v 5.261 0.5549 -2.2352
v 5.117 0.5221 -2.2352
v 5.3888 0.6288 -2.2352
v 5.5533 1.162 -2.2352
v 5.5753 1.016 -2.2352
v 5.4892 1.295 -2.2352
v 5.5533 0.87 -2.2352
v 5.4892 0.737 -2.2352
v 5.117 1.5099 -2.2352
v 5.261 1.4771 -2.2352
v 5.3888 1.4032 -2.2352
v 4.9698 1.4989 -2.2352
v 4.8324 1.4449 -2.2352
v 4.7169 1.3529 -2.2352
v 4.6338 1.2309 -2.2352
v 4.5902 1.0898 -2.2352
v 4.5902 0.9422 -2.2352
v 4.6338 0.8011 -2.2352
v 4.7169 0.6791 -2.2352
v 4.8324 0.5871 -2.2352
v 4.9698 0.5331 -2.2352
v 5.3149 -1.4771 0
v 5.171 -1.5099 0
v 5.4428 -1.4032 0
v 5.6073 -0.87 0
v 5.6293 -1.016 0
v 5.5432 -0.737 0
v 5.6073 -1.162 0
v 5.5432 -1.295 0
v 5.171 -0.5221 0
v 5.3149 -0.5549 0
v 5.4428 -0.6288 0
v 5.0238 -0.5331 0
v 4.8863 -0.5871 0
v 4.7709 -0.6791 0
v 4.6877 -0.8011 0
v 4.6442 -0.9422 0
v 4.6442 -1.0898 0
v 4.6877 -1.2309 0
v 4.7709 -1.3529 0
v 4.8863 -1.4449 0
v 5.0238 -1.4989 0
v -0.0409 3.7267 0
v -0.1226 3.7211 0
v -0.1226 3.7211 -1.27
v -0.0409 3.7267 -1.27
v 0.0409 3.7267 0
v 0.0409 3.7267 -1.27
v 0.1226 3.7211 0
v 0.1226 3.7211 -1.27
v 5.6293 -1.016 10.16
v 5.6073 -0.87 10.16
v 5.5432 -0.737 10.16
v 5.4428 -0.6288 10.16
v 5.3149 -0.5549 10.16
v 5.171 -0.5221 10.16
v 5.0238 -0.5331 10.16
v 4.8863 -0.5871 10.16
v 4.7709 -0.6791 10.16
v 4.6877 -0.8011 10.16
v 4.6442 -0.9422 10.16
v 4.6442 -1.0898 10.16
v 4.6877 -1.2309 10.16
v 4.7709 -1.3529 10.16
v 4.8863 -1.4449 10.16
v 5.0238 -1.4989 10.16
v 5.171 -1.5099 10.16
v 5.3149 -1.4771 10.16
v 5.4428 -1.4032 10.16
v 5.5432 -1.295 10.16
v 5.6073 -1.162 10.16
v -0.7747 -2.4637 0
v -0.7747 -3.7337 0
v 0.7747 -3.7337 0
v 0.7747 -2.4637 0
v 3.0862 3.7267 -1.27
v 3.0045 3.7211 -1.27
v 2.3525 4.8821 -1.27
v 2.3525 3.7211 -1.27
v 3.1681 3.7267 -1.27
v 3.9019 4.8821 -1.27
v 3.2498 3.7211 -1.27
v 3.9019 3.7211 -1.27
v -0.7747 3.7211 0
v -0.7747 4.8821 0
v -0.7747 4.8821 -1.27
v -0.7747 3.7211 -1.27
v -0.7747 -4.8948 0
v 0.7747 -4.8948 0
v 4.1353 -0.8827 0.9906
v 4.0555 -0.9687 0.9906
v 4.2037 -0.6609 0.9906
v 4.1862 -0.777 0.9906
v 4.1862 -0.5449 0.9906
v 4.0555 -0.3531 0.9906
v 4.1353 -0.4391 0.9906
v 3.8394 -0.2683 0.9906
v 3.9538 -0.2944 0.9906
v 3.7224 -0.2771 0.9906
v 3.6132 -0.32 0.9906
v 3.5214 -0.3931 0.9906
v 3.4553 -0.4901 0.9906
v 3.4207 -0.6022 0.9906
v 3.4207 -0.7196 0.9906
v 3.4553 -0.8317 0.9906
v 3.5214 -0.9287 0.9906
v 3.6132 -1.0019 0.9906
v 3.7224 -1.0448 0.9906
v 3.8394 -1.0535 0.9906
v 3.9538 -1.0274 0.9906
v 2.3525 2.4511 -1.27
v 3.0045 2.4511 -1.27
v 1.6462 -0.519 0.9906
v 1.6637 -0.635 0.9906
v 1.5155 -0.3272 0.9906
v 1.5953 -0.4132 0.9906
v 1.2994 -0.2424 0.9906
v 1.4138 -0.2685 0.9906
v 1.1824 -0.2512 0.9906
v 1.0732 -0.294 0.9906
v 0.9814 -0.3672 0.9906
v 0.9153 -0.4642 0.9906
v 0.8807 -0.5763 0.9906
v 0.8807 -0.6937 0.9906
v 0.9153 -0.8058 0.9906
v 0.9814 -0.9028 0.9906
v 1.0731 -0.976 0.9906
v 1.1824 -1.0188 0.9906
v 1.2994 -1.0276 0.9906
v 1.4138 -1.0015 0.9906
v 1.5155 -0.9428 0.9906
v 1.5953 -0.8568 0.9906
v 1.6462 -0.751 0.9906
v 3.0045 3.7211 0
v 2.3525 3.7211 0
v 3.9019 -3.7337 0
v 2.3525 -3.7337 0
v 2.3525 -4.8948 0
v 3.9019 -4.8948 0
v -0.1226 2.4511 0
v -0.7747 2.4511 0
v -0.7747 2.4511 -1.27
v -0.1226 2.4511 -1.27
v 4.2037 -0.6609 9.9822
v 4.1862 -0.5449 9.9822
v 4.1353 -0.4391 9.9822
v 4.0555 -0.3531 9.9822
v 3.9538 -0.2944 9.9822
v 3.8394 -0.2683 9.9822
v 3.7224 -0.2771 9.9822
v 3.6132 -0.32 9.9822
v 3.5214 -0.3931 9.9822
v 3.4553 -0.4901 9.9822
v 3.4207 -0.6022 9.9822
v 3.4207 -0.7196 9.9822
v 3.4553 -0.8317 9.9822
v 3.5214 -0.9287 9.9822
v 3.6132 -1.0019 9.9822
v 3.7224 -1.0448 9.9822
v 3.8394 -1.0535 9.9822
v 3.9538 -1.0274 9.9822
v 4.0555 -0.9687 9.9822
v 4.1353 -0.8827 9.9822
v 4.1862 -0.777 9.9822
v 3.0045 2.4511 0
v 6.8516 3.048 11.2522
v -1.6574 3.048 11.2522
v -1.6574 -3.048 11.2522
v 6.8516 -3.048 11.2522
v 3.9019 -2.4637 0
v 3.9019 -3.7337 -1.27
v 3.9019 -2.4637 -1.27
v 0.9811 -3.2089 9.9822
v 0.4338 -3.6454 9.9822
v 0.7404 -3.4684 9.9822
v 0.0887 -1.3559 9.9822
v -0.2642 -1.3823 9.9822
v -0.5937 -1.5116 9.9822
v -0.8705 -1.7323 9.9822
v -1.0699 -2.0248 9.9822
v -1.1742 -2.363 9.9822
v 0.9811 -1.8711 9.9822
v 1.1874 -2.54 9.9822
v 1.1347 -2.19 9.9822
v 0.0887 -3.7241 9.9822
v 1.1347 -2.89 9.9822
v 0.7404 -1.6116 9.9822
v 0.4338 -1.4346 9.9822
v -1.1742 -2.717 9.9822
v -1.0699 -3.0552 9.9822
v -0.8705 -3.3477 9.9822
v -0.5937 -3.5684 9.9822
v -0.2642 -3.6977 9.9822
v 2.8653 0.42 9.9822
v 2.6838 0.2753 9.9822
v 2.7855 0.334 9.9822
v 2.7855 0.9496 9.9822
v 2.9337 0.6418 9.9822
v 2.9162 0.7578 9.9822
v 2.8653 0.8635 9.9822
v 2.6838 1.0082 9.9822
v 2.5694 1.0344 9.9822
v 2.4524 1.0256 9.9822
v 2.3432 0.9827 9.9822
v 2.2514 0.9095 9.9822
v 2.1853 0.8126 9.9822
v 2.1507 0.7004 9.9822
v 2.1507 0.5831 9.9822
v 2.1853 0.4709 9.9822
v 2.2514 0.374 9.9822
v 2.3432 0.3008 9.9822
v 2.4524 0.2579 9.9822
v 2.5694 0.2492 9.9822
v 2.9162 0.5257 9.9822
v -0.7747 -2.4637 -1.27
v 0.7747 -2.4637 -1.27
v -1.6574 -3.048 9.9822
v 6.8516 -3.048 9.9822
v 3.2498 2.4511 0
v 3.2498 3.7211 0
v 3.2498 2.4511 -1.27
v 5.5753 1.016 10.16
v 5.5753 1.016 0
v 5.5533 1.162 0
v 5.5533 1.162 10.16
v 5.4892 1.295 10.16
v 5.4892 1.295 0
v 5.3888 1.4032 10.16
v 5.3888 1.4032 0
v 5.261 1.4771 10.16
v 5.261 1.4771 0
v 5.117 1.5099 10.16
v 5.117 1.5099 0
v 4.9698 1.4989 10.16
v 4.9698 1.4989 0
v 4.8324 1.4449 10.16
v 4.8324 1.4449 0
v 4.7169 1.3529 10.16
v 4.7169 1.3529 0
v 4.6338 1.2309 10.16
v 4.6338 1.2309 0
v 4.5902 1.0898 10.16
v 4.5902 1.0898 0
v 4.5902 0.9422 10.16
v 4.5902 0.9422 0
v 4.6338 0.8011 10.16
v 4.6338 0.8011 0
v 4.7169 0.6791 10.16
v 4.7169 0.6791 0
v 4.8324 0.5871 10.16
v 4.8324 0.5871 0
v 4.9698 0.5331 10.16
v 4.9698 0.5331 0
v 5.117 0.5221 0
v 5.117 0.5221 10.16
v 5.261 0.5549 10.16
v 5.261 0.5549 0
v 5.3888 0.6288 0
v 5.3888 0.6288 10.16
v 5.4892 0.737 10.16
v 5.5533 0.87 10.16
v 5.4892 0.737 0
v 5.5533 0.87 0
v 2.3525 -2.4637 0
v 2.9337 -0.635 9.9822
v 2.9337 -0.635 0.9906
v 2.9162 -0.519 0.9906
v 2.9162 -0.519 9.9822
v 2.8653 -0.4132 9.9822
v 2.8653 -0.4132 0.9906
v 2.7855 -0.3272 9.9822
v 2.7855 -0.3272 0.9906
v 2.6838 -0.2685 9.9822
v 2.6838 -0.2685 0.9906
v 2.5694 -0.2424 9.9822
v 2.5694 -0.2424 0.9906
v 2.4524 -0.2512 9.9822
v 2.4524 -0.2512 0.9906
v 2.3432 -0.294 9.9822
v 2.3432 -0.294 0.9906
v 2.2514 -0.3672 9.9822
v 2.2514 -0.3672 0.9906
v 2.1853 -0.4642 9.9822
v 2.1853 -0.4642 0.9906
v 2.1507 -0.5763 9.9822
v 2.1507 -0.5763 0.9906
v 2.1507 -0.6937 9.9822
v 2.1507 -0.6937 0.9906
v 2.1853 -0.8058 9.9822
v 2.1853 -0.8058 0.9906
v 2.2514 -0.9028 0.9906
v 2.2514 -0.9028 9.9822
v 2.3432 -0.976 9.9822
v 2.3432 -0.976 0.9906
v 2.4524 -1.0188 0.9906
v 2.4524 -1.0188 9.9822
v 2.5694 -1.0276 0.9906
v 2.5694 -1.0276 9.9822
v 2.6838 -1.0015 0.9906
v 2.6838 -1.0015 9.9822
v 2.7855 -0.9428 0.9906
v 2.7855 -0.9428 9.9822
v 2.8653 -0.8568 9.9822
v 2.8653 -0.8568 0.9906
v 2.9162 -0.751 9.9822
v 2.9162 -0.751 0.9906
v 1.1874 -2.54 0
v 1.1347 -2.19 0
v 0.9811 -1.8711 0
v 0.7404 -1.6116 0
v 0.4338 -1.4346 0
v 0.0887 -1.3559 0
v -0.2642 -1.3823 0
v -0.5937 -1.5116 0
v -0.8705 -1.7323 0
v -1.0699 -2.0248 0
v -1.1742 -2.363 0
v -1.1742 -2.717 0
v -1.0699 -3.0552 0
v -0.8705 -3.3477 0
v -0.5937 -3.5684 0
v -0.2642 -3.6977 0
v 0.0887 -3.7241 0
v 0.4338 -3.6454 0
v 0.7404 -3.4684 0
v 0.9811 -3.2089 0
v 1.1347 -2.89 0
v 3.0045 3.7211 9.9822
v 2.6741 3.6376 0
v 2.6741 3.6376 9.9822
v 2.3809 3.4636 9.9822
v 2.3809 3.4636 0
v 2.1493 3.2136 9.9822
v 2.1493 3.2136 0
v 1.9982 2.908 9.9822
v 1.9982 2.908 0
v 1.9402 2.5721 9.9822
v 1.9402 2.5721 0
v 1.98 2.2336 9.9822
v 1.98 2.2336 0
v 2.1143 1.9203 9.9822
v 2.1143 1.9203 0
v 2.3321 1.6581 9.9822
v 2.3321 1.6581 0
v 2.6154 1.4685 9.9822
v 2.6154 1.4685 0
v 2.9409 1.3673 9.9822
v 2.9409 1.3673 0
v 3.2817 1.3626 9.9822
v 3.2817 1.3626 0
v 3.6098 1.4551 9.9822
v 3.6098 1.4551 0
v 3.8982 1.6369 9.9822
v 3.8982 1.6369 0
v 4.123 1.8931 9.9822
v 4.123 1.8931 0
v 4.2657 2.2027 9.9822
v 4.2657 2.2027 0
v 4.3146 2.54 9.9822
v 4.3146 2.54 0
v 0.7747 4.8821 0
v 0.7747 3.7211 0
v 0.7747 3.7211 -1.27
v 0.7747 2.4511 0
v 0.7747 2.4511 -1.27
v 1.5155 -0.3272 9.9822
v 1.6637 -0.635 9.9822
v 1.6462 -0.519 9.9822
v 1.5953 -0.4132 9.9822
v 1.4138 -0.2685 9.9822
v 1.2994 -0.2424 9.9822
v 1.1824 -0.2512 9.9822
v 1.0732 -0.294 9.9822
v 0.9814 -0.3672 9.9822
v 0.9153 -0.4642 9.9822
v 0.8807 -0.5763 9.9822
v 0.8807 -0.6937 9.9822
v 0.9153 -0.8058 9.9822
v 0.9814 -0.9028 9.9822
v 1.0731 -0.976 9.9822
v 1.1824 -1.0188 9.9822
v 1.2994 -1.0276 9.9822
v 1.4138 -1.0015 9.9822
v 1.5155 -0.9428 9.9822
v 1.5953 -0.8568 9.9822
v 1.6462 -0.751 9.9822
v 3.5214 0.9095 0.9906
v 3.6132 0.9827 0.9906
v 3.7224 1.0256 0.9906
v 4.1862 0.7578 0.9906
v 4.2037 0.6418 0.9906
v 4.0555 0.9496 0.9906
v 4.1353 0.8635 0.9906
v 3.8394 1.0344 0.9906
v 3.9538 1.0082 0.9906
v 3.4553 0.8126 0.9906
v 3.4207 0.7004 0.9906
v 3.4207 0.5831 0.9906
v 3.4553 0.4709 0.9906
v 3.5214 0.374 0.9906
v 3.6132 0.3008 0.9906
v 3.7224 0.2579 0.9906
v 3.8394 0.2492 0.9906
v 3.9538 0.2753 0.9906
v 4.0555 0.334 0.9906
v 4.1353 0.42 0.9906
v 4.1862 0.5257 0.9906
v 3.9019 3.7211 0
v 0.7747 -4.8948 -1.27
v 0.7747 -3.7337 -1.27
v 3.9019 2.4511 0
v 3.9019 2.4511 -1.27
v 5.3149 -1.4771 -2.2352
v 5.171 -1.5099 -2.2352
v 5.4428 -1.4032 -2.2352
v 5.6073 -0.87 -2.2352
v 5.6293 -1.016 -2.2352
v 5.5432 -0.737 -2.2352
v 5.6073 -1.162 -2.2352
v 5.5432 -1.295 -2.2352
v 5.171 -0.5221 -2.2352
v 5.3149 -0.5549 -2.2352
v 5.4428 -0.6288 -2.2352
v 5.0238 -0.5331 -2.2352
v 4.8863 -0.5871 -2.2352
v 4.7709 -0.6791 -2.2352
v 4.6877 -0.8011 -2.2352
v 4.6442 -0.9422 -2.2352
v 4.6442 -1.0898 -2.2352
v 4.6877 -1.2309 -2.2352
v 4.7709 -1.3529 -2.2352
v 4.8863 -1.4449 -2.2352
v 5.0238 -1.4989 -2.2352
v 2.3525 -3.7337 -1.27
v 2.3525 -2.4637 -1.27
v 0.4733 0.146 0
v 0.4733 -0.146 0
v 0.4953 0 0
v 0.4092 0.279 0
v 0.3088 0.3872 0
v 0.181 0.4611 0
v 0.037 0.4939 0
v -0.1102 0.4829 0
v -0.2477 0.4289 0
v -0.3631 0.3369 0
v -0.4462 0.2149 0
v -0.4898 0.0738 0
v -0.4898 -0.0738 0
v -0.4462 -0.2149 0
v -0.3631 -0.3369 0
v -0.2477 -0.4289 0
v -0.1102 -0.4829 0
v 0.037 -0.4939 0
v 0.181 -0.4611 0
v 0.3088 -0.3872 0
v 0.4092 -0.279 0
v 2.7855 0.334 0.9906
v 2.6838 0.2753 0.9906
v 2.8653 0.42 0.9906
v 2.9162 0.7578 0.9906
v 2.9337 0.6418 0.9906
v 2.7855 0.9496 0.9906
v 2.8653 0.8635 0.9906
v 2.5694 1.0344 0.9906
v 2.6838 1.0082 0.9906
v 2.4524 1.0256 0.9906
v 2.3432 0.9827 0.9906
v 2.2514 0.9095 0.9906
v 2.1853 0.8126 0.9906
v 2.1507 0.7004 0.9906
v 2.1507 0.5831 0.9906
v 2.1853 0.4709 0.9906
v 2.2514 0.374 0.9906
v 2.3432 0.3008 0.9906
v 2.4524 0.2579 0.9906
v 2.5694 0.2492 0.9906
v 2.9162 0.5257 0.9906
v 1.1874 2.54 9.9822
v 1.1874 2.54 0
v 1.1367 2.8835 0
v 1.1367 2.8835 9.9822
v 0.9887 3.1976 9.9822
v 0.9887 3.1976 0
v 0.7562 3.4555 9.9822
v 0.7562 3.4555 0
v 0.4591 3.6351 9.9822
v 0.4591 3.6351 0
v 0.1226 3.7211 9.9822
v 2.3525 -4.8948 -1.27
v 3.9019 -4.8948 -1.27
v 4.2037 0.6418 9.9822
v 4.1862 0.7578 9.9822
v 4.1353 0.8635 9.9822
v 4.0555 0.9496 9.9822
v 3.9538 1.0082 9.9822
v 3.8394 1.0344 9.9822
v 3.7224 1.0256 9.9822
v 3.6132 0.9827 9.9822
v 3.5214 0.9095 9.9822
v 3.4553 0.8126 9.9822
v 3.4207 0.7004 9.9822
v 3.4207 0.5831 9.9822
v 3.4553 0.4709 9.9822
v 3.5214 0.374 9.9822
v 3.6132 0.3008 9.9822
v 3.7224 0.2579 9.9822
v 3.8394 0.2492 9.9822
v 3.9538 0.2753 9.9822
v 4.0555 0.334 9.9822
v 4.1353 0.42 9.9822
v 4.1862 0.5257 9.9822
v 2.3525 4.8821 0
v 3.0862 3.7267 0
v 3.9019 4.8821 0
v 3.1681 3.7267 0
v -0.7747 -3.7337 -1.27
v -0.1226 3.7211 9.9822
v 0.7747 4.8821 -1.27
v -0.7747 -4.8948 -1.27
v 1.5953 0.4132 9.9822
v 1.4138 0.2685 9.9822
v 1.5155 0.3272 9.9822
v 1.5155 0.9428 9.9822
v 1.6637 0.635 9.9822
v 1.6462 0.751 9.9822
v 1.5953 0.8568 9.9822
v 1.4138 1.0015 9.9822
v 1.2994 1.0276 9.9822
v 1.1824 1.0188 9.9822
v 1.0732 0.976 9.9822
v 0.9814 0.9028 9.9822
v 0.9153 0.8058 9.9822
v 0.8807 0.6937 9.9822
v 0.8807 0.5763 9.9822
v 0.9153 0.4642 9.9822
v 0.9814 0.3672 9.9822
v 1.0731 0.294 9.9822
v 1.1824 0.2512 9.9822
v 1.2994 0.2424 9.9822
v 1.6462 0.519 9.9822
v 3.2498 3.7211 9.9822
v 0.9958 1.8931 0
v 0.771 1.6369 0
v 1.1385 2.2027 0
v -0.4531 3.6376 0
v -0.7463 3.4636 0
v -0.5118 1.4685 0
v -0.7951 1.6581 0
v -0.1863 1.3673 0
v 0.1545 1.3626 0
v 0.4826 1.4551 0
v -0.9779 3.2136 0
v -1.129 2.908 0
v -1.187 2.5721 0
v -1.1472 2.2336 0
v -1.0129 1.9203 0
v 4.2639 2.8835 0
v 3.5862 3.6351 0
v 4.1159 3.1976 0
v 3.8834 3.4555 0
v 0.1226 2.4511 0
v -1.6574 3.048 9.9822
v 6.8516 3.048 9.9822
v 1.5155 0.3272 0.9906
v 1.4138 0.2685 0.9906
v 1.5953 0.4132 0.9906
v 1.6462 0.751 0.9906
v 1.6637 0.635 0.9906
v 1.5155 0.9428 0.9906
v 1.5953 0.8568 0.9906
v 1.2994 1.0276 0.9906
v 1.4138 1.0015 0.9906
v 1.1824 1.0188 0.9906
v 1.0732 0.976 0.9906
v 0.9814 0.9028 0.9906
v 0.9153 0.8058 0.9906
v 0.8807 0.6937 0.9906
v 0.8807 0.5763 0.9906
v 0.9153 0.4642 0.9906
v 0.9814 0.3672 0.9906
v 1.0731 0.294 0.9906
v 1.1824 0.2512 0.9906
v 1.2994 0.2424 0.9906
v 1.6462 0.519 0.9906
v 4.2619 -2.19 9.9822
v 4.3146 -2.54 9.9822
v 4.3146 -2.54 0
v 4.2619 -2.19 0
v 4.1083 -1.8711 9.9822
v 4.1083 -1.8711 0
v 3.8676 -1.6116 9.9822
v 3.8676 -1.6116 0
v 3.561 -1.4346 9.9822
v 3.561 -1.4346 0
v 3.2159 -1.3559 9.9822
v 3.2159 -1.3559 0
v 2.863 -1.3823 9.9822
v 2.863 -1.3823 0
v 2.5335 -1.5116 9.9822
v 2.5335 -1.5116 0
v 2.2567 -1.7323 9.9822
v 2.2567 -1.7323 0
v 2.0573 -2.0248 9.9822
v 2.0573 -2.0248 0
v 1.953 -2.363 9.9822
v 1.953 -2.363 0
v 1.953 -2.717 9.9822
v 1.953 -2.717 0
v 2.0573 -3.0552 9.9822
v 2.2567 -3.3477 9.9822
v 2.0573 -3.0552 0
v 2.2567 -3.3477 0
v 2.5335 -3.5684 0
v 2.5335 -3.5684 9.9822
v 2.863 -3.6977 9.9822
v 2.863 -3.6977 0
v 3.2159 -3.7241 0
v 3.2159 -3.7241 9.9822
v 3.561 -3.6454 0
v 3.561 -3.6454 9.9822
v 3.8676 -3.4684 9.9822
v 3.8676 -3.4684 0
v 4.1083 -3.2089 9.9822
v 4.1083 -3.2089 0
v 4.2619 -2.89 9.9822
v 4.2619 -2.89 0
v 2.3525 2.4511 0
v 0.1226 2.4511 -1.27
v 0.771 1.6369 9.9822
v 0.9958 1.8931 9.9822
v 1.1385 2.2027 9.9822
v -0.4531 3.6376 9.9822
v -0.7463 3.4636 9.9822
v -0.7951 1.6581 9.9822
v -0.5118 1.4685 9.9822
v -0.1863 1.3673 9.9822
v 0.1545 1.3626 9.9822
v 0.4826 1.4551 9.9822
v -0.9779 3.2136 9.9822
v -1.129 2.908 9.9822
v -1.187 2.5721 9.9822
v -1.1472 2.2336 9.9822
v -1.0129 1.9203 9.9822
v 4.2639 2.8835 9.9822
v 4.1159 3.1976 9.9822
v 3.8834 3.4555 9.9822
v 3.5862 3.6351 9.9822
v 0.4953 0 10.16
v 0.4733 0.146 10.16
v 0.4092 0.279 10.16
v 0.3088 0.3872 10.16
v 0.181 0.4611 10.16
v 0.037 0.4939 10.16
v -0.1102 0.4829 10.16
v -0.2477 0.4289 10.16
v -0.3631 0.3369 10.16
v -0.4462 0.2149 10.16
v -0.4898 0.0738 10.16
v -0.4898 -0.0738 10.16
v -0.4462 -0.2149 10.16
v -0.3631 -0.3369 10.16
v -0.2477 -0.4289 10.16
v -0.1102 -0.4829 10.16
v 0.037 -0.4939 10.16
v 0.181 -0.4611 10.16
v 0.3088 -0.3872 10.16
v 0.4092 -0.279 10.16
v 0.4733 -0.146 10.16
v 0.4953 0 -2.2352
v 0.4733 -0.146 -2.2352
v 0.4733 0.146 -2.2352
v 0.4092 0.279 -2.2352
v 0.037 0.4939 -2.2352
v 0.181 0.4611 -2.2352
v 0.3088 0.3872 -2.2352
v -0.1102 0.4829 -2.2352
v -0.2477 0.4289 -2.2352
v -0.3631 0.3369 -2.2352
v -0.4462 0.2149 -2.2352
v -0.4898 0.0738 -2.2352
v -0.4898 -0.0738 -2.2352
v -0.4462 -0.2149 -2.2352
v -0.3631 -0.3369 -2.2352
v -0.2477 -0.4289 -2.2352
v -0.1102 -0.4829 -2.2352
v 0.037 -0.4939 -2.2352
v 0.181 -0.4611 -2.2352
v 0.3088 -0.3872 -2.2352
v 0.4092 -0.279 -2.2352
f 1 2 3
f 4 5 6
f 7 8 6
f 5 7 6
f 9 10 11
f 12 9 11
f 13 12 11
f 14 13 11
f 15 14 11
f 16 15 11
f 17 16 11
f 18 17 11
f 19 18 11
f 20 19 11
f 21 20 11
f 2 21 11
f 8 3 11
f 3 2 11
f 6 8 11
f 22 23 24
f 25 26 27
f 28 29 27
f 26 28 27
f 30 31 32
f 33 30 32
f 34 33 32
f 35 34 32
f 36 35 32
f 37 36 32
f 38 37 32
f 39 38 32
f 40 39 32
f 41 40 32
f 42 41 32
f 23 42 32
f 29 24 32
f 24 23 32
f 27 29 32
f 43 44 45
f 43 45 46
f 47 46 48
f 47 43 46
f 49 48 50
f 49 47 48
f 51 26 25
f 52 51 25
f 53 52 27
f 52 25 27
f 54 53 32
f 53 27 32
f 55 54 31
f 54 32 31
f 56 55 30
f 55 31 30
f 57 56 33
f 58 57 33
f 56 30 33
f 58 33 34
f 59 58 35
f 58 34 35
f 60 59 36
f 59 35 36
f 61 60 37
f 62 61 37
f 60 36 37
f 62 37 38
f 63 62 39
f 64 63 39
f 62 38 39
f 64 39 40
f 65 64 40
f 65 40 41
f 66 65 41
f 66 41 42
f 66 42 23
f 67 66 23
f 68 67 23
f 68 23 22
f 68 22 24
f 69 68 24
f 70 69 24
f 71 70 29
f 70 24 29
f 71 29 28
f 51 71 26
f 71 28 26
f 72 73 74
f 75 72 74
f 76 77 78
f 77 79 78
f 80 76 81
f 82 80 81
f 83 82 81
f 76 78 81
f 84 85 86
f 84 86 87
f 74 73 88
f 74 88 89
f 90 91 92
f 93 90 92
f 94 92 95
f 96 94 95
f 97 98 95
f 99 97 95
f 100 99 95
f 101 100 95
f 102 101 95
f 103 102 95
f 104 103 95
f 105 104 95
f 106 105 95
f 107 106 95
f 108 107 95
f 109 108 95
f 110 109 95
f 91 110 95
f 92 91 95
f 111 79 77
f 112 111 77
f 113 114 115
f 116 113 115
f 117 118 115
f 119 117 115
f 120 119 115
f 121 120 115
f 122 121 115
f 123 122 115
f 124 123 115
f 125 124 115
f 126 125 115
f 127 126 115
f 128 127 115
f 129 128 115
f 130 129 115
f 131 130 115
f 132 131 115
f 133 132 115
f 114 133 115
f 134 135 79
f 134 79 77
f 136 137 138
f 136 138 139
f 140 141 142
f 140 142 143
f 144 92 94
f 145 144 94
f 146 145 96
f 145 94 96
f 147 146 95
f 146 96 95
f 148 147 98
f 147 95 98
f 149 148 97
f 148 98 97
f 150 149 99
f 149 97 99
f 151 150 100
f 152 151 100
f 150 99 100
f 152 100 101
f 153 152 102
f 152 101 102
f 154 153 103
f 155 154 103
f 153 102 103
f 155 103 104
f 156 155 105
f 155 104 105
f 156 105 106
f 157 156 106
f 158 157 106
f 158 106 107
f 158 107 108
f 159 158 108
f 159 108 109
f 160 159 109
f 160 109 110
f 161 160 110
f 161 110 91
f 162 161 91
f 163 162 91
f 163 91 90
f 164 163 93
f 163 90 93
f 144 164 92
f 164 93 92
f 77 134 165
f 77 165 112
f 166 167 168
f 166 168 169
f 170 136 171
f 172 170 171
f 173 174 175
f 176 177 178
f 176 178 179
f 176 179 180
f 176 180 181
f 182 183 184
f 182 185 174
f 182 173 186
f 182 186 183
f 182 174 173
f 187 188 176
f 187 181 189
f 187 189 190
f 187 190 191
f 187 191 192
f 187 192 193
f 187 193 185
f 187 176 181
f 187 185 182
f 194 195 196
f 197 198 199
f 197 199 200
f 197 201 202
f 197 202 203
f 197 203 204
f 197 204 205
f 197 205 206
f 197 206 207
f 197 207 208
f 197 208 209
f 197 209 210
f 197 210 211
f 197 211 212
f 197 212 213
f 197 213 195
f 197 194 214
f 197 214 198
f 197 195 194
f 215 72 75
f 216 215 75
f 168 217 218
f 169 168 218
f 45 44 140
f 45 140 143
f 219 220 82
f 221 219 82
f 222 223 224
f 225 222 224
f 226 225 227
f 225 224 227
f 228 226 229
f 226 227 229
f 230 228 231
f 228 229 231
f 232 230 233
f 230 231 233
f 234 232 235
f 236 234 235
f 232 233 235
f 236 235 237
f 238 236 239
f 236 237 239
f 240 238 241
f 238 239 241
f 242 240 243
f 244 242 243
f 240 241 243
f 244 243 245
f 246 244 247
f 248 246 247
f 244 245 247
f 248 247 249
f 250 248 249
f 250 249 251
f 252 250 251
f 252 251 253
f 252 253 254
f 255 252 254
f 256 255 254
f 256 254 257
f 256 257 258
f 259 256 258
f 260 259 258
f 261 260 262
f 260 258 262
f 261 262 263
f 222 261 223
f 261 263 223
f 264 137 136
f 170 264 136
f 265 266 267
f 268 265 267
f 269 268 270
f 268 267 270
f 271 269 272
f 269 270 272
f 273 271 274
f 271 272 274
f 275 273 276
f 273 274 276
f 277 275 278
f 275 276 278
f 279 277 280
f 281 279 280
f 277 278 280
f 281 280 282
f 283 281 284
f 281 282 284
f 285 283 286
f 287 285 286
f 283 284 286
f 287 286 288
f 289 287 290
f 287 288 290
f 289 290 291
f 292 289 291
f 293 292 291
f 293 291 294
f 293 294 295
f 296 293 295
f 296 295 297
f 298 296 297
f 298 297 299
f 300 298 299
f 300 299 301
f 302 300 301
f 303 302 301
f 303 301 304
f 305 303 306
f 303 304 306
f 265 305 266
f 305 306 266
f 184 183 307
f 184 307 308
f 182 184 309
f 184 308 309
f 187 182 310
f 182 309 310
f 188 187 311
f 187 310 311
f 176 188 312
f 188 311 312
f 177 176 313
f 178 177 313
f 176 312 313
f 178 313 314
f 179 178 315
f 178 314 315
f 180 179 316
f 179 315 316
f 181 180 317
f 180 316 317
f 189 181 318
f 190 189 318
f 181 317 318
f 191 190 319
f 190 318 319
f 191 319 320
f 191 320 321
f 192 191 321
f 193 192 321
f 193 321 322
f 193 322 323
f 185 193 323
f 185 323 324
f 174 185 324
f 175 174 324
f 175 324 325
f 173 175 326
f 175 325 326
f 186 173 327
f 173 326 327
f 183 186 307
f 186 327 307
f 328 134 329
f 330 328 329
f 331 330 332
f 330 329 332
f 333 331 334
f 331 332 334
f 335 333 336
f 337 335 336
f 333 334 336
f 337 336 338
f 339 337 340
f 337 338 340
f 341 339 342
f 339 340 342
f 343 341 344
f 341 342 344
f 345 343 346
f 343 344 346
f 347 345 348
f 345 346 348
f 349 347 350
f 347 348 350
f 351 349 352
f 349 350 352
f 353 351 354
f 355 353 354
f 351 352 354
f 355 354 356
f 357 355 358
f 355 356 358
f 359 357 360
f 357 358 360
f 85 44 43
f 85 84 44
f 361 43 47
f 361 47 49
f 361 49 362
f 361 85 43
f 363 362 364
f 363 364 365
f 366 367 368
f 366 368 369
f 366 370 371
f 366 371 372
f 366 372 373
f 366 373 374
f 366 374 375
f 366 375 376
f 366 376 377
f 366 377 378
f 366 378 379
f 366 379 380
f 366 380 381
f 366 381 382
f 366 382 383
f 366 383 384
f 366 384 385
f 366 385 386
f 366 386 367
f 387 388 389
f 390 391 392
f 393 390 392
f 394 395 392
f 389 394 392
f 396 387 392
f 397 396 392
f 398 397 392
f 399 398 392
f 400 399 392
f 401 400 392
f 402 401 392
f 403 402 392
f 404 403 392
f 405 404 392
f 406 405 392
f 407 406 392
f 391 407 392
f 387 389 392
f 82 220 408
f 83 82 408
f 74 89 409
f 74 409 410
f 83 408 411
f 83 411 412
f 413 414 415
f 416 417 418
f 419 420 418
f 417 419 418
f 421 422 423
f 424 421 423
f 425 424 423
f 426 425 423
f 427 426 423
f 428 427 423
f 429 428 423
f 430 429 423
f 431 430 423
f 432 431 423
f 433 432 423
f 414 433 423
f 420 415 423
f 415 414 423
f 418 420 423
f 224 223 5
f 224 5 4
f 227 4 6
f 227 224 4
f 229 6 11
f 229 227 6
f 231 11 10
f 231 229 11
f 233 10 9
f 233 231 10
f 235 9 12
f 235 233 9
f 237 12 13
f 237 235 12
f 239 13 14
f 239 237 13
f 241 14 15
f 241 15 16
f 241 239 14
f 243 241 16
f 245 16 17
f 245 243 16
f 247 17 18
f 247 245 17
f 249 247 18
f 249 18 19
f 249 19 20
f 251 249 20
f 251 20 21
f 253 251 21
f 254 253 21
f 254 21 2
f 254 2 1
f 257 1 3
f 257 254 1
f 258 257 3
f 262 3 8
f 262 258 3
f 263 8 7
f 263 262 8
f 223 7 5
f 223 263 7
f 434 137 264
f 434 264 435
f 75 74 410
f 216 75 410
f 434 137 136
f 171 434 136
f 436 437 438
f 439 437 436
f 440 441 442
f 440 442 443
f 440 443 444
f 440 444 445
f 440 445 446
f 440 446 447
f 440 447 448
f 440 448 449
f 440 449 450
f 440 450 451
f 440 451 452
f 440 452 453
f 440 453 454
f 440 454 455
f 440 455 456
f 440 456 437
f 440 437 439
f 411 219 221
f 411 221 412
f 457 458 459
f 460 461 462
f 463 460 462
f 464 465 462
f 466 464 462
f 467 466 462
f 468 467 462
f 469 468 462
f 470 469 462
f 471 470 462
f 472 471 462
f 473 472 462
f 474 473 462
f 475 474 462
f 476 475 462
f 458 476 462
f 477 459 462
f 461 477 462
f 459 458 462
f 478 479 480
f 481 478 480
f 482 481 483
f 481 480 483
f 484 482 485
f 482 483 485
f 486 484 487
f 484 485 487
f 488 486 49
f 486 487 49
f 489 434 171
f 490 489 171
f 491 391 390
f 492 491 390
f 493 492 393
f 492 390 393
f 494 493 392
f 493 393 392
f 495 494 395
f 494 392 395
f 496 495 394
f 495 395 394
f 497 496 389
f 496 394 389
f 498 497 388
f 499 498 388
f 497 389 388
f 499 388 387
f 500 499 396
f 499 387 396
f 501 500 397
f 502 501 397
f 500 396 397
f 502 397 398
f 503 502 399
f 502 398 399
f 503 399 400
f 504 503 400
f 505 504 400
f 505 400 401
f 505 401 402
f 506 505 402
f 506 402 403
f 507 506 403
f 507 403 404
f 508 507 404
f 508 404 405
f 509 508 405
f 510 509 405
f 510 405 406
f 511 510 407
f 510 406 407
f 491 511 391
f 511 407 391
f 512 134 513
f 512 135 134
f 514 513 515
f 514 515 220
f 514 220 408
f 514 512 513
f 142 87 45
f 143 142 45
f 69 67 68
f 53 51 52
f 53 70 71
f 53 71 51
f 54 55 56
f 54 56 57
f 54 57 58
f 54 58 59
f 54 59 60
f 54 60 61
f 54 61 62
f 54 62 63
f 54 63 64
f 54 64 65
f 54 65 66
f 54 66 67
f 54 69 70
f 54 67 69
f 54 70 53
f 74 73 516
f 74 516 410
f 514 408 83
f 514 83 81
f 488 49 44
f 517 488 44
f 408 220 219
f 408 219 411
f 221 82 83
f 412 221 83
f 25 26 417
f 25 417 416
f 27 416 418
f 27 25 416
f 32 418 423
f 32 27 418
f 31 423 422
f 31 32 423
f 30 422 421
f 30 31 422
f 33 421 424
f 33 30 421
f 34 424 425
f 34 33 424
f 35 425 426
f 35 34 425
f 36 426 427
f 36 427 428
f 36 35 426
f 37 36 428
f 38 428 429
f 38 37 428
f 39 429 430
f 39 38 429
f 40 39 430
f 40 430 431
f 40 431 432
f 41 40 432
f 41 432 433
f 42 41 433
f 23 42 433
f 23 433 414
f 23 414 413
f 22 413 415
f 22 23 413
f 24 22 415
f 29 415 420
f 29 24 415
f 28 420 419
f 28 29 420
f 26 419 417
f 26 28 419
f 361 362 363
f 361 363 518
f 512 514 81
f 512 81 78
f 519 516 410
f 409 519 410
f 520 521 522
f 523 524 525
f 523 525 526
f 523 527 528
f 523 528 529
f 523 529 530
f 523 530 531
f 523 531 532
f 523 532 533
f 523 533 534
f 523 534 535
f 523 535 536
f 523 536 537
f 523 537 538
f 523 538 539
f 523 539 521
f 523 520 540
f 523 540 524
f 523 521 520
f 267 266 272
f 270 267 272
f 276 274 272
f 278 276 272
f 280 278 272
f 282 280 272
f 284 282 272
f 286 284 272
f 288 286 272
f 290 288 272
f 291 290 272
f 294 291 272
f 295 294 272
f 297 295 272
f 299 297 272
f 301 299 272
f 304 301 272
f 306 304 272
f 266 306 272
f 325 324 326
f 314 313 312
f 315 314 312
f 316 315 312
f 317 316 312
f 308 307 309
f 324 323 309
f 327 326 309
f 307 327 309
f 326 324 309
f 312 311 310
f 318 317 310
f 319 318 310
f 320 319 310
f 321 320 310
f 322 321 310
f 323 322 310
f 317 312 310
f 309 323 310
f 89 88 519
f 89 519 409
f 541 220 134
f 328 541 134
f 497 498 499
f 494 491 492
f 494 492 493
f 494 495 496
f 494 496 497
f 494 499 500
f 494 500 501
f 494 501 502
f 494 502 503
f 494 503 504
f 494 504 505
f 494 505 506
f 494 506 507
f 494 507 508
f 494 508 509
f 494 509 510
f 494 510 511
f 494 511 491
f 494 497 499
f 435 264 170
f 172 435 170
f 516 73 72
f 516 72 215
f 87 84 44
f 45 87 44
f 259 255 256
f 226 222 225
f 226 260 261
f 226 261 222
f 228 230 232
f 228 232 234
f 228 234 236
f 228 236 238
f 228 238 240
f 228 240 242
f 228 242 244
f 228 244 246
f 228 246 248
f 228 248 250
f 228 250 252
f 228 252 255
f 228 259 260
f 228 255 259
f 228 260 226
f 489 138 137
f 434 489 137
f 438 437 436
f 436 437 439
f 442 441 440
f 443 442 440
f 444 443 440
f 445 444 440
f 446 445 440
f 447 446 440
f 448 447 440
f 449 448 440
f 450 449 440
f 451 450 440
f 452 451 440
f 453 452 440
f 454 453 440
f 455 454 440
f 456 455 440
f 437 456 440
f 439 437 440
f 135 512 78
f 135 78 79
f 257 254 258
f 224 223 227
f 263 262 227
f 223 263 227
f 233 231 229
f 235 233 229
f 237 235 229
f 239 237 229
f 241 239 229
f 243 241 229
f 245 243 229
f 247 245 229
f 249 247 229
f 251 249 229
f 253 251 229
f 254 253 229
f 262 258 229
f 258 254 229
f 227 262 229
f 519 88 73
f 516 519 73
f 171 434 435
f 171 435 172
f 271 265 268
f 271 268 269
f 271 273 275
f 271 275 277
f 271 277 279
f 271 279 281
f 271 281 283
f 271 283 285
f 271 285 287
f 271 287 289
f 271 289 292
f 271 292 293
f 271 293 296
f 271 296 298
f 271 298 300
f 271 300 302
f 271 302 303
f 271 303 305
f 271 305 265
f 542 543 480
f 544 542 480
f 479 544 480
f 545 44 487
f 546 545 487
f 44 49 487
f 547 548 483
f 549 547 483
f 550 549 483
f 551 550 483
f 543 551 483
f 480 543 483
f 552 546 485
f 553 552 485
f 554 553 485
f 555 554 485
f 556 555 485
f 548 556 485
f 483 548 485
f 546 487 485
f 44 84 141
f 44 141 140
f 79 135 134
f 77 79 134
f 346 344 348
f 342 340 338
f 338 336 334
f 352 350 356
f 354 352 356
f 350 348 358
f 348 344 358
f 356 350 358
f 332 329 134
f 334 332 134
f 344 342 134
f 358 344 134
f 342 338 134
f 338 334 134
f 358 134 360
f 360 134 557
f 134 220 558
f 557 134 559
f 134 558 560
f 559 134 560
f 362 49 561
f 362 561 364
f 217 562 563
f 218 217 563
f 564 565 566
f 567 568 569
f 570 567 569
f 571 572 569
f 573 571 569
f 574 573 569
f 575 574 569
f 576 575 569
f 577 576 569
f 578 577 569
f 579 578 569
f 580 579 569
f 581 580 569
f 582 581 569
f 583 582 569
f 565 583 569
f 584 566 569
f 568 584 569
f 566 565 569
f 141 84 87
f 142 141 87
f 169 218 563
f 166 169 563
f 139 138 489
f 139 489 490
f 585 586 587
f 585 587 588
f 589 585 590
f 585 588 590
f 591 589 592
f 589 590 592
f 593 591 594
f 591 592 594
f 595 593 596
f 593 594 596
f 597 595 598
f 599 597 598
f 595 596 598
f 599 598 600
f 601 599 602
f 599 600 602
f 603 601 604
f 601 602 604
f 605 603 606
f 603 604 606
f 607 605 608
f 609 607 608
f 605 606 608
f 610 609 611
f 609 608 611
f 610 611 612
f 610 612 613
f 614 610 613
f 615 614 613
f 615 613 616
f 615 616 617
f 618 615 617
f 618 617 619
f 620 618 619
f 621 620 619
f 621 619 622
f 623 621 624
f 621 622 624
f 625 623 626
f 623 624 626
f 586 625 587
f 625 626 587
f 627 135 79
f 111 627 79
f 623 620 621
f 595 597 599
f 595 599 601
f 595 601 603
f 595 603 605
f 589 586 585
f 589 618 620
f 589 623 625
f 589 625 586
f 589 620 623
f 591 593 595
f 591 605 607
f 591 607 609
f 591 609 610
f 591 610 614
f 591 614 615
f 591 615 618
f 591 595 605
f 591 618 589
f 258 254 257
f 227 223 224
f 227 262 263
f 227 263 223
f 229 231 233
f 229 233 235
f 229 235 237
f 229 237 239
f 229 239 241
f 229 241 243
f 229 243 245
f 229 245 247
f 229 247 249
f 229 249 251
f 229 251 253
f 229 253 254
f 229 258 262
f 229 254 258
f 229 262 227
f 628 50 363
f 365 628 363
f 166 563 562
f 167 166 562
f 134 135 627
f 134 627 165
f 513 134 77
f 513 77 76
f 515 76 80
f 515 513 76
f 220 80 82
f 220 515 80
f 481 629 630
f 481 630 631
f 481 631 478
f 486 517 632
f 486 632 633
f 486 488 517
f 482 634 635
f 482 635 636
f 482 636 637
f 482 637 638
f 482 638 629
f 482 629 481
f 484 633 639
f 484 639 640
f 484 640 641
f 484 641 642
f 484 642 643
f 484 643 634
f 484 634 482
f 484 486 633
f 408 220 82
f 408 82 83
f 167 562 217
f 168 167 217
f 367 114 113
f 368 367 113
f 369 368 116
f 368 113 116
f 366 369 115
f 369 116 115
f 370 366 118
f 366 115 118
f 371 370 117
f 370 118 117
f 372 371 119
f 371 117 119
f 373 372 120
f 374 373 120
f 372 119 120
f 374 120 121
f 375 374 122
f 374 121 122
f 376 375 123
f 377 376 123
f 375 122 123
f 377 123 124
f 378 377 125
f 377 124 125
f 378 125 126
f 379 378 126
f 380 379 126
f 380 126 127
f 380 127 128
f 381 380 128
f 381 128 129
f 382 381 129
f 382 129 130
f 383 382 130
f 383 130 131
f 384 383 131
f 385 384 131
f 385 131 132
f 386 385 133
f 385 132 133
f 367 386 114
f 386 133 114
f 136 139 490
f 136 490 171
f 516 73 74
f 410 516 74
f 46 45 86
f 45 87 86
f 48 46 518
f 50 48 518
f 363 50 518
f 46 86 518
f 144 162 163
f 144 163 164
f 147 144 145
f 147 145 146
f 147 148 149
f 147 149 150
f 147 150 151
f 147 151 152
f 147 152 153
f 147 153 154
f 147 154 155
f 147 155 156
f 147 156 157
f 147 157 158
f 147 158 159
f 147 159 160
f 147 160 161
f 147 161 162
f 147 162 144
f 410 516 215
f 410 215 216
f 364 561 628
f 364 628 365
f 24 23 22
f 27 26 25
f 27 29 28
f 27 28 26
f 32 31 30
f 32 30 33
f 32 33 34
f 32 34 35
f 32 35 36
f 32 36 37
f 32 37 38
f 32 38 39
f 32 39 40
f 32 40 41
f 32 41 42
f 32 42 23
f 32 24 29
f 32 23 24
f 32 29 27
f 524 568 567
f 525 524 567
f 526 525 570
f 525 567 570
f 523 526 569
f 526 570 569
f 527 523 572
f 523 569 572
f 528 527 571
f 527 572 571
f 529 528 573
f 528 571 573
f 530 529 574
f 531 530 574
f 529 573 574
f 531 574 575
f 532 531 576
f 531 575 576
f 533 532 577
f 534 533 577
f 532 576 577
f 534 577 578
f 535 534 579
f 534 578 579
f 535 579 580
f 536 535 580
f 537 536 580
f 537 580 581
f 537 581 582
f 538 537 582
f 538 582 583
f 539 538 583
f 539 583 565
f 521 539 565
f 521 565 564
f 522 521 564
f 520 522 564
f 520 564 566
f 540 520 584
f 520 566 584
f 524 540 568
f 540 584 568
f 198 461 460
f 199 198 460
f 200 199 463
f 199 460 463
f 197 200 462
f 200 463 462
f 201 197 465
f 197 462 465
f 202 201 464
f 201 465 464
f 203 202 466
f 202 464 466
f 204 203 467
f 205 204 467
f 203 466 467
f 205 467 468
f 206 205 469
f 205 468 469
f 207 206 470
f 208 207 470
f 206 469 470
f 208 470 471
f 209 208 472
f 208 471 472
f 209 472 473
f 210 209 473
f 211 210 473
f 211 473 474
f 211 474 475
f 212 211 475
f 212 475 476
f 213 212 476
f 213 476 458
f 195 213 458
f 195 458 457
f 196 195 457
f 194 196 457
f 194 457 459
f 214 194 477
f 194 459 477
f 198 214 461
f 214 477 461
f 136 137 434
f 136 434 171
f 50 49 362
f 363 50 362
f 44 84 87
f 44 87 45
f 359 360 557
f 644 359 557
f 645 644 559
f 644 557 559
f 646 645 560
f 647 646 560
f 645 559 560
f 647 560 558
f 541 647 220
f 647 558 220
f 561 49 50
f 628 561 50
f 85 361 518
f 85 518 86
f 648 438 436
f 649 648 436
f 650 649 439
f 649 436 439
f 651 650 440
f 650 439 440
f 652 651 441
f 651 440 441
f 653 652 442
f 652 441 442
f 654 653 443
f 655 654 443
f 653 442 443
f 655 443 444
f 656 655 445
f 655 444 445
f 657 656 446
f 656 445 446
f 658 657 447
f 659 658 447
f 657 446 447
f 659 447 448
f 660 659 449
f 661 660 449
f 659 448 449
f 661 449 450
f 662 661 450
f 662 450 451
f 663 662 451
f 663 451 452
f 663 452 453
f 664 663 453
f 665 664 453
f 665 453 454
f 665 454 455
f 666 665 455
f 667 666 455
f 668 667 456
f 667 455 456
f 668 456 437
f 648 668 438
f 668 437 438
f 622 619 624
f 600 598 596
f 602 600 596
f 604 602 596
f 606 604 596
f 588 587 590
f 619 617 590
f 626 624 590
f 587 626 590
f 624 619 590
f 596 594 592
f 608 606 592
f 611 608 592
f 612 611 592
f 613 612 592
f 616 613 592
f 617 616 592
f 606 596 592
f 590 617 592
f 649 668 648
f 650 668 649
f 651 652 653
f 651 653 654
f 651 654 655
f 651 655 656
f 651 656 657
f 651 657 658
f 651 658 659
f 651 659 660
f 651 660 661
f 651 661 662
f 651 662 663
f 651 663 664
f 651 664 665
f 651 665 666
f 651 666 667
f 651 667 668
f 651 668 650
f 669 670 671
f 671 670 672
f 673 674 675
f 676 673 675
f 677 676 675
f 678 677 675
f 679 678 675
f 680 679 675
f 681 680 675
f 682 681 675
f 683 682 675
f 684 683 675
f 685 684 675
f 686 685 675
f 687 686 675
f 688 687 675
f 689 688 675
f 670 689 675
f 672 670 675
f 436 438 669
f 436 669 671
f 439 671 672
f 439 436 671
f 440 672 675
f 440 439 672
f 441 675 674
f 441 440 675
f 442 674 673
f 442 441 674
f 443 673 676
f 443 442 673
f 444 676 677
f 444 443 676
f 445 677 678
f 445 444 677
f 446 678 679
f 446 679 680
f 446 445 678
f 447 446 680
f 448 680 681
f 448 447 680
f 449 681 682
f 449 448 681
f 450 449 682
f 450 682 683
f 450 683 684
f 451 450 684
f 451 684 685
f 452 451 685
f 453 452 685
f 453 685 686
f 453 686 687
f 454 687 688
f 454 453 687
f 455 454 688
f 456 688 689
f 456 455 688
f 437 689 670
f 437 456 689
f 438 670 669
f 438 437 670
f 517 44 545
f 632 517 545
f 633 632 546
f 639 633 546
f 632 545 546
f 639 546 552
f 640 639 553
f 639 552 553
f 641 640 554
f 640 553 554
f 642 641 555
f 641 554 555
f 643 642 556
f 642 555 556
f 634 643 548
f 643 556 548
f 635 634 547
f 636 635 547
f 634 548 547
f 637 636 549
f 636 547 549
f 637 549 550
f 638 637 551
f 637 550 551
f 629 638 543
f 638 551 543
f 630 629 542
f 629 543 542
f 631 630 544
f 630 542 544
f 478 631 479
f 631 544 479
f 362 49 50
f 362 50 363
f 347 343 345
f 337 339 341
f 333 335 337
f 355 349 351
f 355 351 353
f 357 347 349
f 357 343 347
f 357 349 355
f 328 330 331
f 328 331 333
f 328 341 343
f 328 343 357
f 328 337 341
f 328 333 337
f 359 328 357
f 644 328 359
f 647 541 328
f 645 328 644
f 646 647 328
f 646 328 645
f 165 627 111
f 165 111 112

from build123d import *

# Parameters (mm, degrees)
F1_DEPTH = 1.27
F0_W     = 1.5494
F0_H     = 1.161047956
F0_R     = 0.4953
F2_DEPTH = 2.2352
F0_R_2   = 1.18745
F3_DEPTH = 9.9822
F4_DEPTH = 1.27
F5_DEPTH = 1.27
F6_START = 0.9906
F0_R_3   = 0.3937
F6_DEPTH = 8.9916
F8_DEPTH = 1.27
F9_DEPTH = 10.16


with BuildPart() as f1:
    # F0 (on Top) → F1 (new body)
    with BuildSketch(Plane.XY):
        with BuildLine():
            ThreePointArc((-0.1226388703, 3.7211), (0, 3.72745), (0.1226388703, 3.7211))
            Line((0.1226388703, 3.7211), (0.7747, 3.7211))
            Line((0.7747, 3.7211), (0.7747, 4.882147956))
            Line((0.7747, 4.882147956), (-0.7747, 4.882147956))
            Line((-0.7747, 4.882147956), (-0.7747, 3.7211))
            Line((-0.7747, 3.7211), (-0.1226388703, 3.7211))
        make_face()
    extrude(amount=-F1_DEPTH)


with BuildPart() as f1b:
    # F0 (on Top) → F1, piece 2 (new body)
    with BuildSketch(Plane.XY):
        with BuildLine():
            ThreePointArc((3.0045490859, 3.7211), (3.1271879561, 3.72745), (3.2498268264, 3.7211))
            Line((3.2498268264, 3.7211), (3.9018879561, 3.7211))
            Line((3.9018879561, 3.7211), (3.9018879561, 4.882147956))
            Line((3.9018879561, 4.882147956), (2.3524879561, 4.882147956))
            Line((2.3524879561, 4.882147956), (2.3524879561, 3.7211))
            Line((2.3524879561, 3.7211), (3.0045490859, 3.7211))
        make_face()
    extrude(amount=-F1_DEPTH)


with BuildPart() as f1c:
    # F0 (on Top) → F1, piece 3 (new body)
    with BuildSketch(Plane.XY):
        with Locations((0, -4.3142373906)):
            Rectangle(F0_W, F0_H)
    extrude(amount=-F1_DEPTH)


with BuildPart() as f1d:
    # F0 (on Top) → F1, piece 4 (new body)
    with BuildSketch(Plane.XY):
        with Locations((3.1271879561, -4.3142373906)):
            Rectangle(F0_W, F0_H)
    extrude(amount=-F1_DEPTH)


with BuildPart() as f2:
    # F0 (on Top) → F2 (new body)
    with BuildSketch(Plane.XY):
        with Locations((5.1339846104, -1.016)):
            Circle(F0_R)
    extrude(amount=-F2_DEPTH)


with BuildPart() as f2b:
    # F0 (on Top) → F2, piece 2 (new body)
    with BuildSketch(Plane.XY):
        with Locations((5.08, 1.016)):
            Circle(F0_R)
    extrude(amount=-F2_DEPTH)


with BuildPart() as f2c:
    # F0 (on Top) → F2, piece 3 (new body)
    with BuildSketch(Plane.XY):
        Circle(F0_R)
    extrude(amount=-F2_DEPTH)


with BuildPart() as f3:
    # F0 (on Top) → F3 (new body)
    with BuildSketch(Plane.XY):
        with Locations((0, -2.54)):
            Circle(F0_R_2)
        with Locations((3.1271879561, -2.54)):
            Circle(F0_R_2)
        with BuildLine():
            ThreePointArc((3.0045490859, 3.7211), (2.3320747642, 1.6580518641), (4.3146379561, 2.54))
            ThreePointArc((4.3146379561, 2.54), (4.0091360921, 3.3351131919), (3.2498268264, 3.7211))
            Line((3.2498268264, 3.7211), (3.0045490859, 3.7211))
        make_face()
        with BuildLine():
            ThreePointArc((-0.1226388703, 3.7211), (-0.7951131919, 1.6580518641), (1.18745, 2.54))
            ThreePointArc((1.18745, 2.54), (0.8819481359, 3.3351131919), (0.1226388703, 3.7211))
            Line((0.1226388703, 3.7211), (-0.1226388703, 3.7211))
        make_face()
    extrude(amount=F3_DEPTH)


with BuildPart() as f4:
    # F4 (new): a face of the model
    f4_faces = [f1.part.faces().sort_by_distance(p)[0] for p in [
        (0.4486694351, 3.7211, -0.635),
    ]]
    extrude(f4_faces, amount=F4_DEPTH)


with BuildPart() as f4b:
    # F4#2 (new): a face of the model
    f4_2_faces = [f1.part.faces().sort_by_distance(p)[0] for p in [
        (-0.4486694351, 3.7211, -0.635),
    ]]
    extrude(f4_2_faces, amount=F4_DEPTH)


with BuildPart() as f4c:
    # F4#3 (new): a face of the model
    f4_3_faces = [f1b.part.faces().sort_by_distance(p)[0] for p in [
        (2.678518521, 3.7211, -0.635),
    ]]
    extrude(f4_3_faces, amount=F4_DEPTH)


with BuildPart() as f4d:
    # F4#4 (new): a face of the model
    f4_4_faces = [f1b.part.faces().sort_by_distance(p)[0] for p in [
        (3.5758573913, 3.7211, -0.635),
    ]]
    extrude(f4_4_faces, amount=F4_DEPTH)


with BuildPart() as f5:
    # F5 (new): a face of the model
    f5_faces = [f1c.part.faces().sort_by_distance(p)[0] for p in [
        (0, -3.7337134127, -0.635),
    ]]
    extrude(f5_faces, amount=F5_DEPTH)


with BuildPart() as f5b:
    # F5#2 (new): a face of the model
    f5_2_faces = [f1d.part.faces().sort_by_distance(p)[0] for p in [
        (3.1271879561, -3.7337134127, -0.635),
    ]]
    extrude(f5_2_faces, amount=F5_DEPTH)


with BuildPart() as f6:
    # F0 (on Top) → F6 (new body)
    with BuildSketch(Plane.XY.offset(F6_START)):
        with Locations((3.81, -0.660923452)):
            Circle(F0_R_3)
    extrude(amount=F6_DEPTH)


with BuildPart() as f6b:
    # F0 (on Top) → F6, piece 2 (new body)
    with BuildSketch(Plane.XY.offset(F6_START)):
        with Locations((3.81, 0.6417604301)):
            Circle(F0_R_3)
    extrude(amount=F6_DEPTH)


with BuildPart() as f6c:
    # F0 (on Top) → F6, piece 3 (new body)
    with BuildSketch(Plane.XY.offset(F6_START)):
        with Locations((2.54, 0.6417604301)):
            Circle(F0_R_3)
    extrude(amount=F6_DEPTH)


with BuildPart() as f6d:
    # F0 (on Top) → F6, piece 4 (new body)
    with BuildSketch(Plane.XY.offset(F6_START)):
        with Locations((2.54, -0.635)):
            Circle(F0_R_3)
    extrude(amount=F6_DEPTH)


with BuildPart() as f6e:
    # F0 (on Top) → F6, piece 5 (new body)
    with BuildSketch(Plane.XY.offset(F6_START)):
        with Locations((1.27, -0.635)):
            Circle(F0_R_3)
    extrude(amount=F6_DEPTH)


with BuildPart() as f6f:
    # F0 (on Top) → F6, piece 6 (new body)
    with BuildSketch(Plane.XY.offset(F6_START)):
        with Locations((1.27, 0.635)):
            Circle(F0_R_3)
    extrude(amount=F6_DEPTH)


with BuildPart() as f8:
    # F7 (on face) → F8 (new body)
    with BuildSketch(Plane.XY.offset(9.9822)):
        with BuildLine():
            Line((6.85165, -3.048), (6.85165, 3.048))
            Line((6.85165, 3.048), (1.0733002853, 3.048))
            ThreePointArc((1.0733002853, 3.048), (0, 1.35255), (-1.0733002853, 3.048))
            Line((-1.0733002853, 3.048), (-1.65735, 3.048))
            Line((-1.65735, 3.048), (-1.65735, -3.048))
            Line((-1.65735, -3.048), (6.85165, -3.048))
        make_face()
        with BuildLine():
            ThreePointArc((-1.0733002853, 3.048), (0, 1.35255), (1.0733002853, 3.048))
            Line((1.0733002853, 3.048), (-1.0733002853, 3.048))
        make_face()
    extrude(amount=F8_DEPTH)


with BuildPart() as f9:
    # F0 (on Top) → F9 (new body)
    with BuildSketch(Plane.XY):
        Circle(F0_R)
    extrude(amount=F9_DEPTH)


with BuildPart() as f9b:
    # F0 (on Top) → F9, piece 2 (new body)
    with BuildSketch(Plane.XY):
        with Locations((5.08, 1.016)):
            Circle(F0_R)
    extrude(amount=F9_DEPTH)


with BuildPart() as f9c:
    # F0 (on Top) → F9, piece 3 (new body)
    with BuildSketch(Plane.XY):
        with Locations((5.1339846104, -1.016)):
            Circle(F0_R)
    extrude(amount=F9_DEPTH)


solid = Compound([f1.part, f1b.part, f1c.part, f1d.part, f2.part, f2b.part, f2c.part, f3.part, f4.part, f4b.part, f4c.part, f4d.part, f5.part, f5b.part, f6.part, f6b.part, f6c.part, f6d.part, f6e.part, f6f.part, f8.part, f9.part, f9b.part, f9c.part])
